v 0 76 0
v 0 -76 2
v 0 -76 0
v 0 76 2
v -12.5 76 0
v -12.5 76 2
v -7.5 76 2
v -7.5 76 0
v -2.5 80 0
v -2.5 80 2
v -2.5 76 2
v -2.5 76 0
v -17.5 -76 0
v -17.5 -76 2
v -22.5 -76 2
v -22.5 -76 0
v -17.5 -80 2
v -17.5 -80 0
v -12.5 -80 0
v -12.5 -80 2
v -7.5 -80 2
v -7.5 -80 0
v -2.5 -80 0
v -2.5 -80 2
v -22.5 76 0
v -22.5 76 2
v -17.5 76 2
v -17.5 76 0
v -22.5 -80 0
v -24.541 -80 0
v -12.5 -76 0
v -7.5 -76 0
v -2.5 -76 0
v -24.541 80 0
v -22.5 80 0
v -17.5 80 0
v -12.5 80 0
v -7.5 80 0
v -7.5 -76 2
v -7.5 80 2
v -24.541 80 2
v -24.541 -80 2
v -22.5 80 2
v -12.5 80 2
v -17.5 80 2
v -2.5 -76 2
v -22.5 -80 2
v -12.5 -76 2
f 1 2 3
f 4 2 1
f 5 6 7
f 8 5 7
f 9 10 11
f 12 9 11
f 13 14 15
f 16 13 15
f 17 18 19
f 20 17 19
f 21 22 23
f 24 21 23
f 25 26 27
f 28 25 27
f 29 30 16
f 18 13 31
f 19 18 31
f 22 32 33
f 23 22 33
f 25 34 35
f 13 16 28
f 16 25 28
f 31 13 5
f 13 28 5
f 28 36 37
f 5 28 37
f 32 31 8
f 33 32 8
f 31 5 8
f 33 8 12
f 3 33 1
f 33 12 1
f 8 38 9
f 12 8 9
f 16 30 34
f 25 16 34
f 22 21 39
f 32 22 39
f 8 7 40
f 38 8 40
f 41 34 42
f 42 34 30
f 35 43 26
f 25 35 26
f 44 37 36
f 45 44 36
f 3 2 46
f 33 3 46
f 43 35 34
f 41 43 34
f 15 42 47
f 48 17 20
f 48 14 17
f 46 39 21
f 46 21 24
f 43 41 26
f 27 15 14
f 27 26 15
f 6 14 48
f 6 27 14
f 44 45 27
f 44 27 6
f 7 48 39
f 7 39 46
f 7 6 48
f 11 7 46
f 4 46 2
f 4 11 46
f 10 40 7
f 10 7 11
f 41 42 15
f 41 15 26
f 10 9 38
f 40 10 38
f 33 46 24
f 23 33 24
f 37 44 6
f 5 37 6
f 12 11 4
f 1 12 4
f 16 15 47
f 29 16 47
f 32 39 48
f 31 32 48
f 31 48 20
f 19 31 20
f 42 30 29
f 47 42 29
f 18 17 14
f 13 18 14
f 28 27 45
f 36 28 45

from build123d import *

# Parameters (mm, degrees)
F1_DEPTH = 2
F3_DEPTH = 5
F4_W     = 28.972704
F4_H     = 205.101743
F5_DEPTH = 25


with BuildPart() as f1:
    # F0 (on Top) → F1 (new body)
    with BuildSketch(Plane.XY):
        Polygon((-24.541279, -80), (0, -80), (24.541279, -80), (24.541279, 0), (24.541279, 80), (0, 80), (-24.541279, 80), (-24.541279, 0), align=None)
    extrude(amount=F1_DEPTH)

    # F2 (on face) → F3 (cut)
    with BuildSketch(Plane.XY.offset(2)):
        Polygon((2.5, -76), (0, -76), (-2.5, -76), (-2.5, -80), (-7.5, -80), (-7.5, -76), (-12.5, -76), (-12.5, -80), (-17.5, -80), (-17.5, -76), (-22.5, -76), (-22.5, -80), (-22.5, -83.697788), (22.5, -83.697788), (22.5, -80), (22.5, -76), (17.5, -76), (17.5, -80), (12.5, -80), (12.5, -76), (7.5, -76), (7.5, -80), (2.5, -80), align=None)
        Polygon((-22.5, 80), (-22.5, 76), (-17.5, 76), (-17.5, 80), (-12.5, 80), (-12.5, 76), (-7.5, 76), (-7.5, 80), (-2.5, 80), (-2.5, 76), (0, 76), (2.5, 76), (2.5, 80), (7.5, 80), (7.5, 76), (12.5, 76), (12.5, 80), (17.5, 80), (17.5, 76), (22.5, 76), (22.5, 80), (22.5, 83.697788), (-22.5, 83.697788), align=None)
    extrude(amount=-F3_DEPTH, mode=Mode.SUBTRACT)

    # F4 (on face) → F5 (cut)
    with BuildSketch(Plane.XY.offset(2)):
        with Locations((14.486352, 8.12903)):
            Rectangle(F4_W, F4_H)
    extrude(amount=-F5_DEPTH, mode=Mode.SUBTRACT)


solid = f1.part
